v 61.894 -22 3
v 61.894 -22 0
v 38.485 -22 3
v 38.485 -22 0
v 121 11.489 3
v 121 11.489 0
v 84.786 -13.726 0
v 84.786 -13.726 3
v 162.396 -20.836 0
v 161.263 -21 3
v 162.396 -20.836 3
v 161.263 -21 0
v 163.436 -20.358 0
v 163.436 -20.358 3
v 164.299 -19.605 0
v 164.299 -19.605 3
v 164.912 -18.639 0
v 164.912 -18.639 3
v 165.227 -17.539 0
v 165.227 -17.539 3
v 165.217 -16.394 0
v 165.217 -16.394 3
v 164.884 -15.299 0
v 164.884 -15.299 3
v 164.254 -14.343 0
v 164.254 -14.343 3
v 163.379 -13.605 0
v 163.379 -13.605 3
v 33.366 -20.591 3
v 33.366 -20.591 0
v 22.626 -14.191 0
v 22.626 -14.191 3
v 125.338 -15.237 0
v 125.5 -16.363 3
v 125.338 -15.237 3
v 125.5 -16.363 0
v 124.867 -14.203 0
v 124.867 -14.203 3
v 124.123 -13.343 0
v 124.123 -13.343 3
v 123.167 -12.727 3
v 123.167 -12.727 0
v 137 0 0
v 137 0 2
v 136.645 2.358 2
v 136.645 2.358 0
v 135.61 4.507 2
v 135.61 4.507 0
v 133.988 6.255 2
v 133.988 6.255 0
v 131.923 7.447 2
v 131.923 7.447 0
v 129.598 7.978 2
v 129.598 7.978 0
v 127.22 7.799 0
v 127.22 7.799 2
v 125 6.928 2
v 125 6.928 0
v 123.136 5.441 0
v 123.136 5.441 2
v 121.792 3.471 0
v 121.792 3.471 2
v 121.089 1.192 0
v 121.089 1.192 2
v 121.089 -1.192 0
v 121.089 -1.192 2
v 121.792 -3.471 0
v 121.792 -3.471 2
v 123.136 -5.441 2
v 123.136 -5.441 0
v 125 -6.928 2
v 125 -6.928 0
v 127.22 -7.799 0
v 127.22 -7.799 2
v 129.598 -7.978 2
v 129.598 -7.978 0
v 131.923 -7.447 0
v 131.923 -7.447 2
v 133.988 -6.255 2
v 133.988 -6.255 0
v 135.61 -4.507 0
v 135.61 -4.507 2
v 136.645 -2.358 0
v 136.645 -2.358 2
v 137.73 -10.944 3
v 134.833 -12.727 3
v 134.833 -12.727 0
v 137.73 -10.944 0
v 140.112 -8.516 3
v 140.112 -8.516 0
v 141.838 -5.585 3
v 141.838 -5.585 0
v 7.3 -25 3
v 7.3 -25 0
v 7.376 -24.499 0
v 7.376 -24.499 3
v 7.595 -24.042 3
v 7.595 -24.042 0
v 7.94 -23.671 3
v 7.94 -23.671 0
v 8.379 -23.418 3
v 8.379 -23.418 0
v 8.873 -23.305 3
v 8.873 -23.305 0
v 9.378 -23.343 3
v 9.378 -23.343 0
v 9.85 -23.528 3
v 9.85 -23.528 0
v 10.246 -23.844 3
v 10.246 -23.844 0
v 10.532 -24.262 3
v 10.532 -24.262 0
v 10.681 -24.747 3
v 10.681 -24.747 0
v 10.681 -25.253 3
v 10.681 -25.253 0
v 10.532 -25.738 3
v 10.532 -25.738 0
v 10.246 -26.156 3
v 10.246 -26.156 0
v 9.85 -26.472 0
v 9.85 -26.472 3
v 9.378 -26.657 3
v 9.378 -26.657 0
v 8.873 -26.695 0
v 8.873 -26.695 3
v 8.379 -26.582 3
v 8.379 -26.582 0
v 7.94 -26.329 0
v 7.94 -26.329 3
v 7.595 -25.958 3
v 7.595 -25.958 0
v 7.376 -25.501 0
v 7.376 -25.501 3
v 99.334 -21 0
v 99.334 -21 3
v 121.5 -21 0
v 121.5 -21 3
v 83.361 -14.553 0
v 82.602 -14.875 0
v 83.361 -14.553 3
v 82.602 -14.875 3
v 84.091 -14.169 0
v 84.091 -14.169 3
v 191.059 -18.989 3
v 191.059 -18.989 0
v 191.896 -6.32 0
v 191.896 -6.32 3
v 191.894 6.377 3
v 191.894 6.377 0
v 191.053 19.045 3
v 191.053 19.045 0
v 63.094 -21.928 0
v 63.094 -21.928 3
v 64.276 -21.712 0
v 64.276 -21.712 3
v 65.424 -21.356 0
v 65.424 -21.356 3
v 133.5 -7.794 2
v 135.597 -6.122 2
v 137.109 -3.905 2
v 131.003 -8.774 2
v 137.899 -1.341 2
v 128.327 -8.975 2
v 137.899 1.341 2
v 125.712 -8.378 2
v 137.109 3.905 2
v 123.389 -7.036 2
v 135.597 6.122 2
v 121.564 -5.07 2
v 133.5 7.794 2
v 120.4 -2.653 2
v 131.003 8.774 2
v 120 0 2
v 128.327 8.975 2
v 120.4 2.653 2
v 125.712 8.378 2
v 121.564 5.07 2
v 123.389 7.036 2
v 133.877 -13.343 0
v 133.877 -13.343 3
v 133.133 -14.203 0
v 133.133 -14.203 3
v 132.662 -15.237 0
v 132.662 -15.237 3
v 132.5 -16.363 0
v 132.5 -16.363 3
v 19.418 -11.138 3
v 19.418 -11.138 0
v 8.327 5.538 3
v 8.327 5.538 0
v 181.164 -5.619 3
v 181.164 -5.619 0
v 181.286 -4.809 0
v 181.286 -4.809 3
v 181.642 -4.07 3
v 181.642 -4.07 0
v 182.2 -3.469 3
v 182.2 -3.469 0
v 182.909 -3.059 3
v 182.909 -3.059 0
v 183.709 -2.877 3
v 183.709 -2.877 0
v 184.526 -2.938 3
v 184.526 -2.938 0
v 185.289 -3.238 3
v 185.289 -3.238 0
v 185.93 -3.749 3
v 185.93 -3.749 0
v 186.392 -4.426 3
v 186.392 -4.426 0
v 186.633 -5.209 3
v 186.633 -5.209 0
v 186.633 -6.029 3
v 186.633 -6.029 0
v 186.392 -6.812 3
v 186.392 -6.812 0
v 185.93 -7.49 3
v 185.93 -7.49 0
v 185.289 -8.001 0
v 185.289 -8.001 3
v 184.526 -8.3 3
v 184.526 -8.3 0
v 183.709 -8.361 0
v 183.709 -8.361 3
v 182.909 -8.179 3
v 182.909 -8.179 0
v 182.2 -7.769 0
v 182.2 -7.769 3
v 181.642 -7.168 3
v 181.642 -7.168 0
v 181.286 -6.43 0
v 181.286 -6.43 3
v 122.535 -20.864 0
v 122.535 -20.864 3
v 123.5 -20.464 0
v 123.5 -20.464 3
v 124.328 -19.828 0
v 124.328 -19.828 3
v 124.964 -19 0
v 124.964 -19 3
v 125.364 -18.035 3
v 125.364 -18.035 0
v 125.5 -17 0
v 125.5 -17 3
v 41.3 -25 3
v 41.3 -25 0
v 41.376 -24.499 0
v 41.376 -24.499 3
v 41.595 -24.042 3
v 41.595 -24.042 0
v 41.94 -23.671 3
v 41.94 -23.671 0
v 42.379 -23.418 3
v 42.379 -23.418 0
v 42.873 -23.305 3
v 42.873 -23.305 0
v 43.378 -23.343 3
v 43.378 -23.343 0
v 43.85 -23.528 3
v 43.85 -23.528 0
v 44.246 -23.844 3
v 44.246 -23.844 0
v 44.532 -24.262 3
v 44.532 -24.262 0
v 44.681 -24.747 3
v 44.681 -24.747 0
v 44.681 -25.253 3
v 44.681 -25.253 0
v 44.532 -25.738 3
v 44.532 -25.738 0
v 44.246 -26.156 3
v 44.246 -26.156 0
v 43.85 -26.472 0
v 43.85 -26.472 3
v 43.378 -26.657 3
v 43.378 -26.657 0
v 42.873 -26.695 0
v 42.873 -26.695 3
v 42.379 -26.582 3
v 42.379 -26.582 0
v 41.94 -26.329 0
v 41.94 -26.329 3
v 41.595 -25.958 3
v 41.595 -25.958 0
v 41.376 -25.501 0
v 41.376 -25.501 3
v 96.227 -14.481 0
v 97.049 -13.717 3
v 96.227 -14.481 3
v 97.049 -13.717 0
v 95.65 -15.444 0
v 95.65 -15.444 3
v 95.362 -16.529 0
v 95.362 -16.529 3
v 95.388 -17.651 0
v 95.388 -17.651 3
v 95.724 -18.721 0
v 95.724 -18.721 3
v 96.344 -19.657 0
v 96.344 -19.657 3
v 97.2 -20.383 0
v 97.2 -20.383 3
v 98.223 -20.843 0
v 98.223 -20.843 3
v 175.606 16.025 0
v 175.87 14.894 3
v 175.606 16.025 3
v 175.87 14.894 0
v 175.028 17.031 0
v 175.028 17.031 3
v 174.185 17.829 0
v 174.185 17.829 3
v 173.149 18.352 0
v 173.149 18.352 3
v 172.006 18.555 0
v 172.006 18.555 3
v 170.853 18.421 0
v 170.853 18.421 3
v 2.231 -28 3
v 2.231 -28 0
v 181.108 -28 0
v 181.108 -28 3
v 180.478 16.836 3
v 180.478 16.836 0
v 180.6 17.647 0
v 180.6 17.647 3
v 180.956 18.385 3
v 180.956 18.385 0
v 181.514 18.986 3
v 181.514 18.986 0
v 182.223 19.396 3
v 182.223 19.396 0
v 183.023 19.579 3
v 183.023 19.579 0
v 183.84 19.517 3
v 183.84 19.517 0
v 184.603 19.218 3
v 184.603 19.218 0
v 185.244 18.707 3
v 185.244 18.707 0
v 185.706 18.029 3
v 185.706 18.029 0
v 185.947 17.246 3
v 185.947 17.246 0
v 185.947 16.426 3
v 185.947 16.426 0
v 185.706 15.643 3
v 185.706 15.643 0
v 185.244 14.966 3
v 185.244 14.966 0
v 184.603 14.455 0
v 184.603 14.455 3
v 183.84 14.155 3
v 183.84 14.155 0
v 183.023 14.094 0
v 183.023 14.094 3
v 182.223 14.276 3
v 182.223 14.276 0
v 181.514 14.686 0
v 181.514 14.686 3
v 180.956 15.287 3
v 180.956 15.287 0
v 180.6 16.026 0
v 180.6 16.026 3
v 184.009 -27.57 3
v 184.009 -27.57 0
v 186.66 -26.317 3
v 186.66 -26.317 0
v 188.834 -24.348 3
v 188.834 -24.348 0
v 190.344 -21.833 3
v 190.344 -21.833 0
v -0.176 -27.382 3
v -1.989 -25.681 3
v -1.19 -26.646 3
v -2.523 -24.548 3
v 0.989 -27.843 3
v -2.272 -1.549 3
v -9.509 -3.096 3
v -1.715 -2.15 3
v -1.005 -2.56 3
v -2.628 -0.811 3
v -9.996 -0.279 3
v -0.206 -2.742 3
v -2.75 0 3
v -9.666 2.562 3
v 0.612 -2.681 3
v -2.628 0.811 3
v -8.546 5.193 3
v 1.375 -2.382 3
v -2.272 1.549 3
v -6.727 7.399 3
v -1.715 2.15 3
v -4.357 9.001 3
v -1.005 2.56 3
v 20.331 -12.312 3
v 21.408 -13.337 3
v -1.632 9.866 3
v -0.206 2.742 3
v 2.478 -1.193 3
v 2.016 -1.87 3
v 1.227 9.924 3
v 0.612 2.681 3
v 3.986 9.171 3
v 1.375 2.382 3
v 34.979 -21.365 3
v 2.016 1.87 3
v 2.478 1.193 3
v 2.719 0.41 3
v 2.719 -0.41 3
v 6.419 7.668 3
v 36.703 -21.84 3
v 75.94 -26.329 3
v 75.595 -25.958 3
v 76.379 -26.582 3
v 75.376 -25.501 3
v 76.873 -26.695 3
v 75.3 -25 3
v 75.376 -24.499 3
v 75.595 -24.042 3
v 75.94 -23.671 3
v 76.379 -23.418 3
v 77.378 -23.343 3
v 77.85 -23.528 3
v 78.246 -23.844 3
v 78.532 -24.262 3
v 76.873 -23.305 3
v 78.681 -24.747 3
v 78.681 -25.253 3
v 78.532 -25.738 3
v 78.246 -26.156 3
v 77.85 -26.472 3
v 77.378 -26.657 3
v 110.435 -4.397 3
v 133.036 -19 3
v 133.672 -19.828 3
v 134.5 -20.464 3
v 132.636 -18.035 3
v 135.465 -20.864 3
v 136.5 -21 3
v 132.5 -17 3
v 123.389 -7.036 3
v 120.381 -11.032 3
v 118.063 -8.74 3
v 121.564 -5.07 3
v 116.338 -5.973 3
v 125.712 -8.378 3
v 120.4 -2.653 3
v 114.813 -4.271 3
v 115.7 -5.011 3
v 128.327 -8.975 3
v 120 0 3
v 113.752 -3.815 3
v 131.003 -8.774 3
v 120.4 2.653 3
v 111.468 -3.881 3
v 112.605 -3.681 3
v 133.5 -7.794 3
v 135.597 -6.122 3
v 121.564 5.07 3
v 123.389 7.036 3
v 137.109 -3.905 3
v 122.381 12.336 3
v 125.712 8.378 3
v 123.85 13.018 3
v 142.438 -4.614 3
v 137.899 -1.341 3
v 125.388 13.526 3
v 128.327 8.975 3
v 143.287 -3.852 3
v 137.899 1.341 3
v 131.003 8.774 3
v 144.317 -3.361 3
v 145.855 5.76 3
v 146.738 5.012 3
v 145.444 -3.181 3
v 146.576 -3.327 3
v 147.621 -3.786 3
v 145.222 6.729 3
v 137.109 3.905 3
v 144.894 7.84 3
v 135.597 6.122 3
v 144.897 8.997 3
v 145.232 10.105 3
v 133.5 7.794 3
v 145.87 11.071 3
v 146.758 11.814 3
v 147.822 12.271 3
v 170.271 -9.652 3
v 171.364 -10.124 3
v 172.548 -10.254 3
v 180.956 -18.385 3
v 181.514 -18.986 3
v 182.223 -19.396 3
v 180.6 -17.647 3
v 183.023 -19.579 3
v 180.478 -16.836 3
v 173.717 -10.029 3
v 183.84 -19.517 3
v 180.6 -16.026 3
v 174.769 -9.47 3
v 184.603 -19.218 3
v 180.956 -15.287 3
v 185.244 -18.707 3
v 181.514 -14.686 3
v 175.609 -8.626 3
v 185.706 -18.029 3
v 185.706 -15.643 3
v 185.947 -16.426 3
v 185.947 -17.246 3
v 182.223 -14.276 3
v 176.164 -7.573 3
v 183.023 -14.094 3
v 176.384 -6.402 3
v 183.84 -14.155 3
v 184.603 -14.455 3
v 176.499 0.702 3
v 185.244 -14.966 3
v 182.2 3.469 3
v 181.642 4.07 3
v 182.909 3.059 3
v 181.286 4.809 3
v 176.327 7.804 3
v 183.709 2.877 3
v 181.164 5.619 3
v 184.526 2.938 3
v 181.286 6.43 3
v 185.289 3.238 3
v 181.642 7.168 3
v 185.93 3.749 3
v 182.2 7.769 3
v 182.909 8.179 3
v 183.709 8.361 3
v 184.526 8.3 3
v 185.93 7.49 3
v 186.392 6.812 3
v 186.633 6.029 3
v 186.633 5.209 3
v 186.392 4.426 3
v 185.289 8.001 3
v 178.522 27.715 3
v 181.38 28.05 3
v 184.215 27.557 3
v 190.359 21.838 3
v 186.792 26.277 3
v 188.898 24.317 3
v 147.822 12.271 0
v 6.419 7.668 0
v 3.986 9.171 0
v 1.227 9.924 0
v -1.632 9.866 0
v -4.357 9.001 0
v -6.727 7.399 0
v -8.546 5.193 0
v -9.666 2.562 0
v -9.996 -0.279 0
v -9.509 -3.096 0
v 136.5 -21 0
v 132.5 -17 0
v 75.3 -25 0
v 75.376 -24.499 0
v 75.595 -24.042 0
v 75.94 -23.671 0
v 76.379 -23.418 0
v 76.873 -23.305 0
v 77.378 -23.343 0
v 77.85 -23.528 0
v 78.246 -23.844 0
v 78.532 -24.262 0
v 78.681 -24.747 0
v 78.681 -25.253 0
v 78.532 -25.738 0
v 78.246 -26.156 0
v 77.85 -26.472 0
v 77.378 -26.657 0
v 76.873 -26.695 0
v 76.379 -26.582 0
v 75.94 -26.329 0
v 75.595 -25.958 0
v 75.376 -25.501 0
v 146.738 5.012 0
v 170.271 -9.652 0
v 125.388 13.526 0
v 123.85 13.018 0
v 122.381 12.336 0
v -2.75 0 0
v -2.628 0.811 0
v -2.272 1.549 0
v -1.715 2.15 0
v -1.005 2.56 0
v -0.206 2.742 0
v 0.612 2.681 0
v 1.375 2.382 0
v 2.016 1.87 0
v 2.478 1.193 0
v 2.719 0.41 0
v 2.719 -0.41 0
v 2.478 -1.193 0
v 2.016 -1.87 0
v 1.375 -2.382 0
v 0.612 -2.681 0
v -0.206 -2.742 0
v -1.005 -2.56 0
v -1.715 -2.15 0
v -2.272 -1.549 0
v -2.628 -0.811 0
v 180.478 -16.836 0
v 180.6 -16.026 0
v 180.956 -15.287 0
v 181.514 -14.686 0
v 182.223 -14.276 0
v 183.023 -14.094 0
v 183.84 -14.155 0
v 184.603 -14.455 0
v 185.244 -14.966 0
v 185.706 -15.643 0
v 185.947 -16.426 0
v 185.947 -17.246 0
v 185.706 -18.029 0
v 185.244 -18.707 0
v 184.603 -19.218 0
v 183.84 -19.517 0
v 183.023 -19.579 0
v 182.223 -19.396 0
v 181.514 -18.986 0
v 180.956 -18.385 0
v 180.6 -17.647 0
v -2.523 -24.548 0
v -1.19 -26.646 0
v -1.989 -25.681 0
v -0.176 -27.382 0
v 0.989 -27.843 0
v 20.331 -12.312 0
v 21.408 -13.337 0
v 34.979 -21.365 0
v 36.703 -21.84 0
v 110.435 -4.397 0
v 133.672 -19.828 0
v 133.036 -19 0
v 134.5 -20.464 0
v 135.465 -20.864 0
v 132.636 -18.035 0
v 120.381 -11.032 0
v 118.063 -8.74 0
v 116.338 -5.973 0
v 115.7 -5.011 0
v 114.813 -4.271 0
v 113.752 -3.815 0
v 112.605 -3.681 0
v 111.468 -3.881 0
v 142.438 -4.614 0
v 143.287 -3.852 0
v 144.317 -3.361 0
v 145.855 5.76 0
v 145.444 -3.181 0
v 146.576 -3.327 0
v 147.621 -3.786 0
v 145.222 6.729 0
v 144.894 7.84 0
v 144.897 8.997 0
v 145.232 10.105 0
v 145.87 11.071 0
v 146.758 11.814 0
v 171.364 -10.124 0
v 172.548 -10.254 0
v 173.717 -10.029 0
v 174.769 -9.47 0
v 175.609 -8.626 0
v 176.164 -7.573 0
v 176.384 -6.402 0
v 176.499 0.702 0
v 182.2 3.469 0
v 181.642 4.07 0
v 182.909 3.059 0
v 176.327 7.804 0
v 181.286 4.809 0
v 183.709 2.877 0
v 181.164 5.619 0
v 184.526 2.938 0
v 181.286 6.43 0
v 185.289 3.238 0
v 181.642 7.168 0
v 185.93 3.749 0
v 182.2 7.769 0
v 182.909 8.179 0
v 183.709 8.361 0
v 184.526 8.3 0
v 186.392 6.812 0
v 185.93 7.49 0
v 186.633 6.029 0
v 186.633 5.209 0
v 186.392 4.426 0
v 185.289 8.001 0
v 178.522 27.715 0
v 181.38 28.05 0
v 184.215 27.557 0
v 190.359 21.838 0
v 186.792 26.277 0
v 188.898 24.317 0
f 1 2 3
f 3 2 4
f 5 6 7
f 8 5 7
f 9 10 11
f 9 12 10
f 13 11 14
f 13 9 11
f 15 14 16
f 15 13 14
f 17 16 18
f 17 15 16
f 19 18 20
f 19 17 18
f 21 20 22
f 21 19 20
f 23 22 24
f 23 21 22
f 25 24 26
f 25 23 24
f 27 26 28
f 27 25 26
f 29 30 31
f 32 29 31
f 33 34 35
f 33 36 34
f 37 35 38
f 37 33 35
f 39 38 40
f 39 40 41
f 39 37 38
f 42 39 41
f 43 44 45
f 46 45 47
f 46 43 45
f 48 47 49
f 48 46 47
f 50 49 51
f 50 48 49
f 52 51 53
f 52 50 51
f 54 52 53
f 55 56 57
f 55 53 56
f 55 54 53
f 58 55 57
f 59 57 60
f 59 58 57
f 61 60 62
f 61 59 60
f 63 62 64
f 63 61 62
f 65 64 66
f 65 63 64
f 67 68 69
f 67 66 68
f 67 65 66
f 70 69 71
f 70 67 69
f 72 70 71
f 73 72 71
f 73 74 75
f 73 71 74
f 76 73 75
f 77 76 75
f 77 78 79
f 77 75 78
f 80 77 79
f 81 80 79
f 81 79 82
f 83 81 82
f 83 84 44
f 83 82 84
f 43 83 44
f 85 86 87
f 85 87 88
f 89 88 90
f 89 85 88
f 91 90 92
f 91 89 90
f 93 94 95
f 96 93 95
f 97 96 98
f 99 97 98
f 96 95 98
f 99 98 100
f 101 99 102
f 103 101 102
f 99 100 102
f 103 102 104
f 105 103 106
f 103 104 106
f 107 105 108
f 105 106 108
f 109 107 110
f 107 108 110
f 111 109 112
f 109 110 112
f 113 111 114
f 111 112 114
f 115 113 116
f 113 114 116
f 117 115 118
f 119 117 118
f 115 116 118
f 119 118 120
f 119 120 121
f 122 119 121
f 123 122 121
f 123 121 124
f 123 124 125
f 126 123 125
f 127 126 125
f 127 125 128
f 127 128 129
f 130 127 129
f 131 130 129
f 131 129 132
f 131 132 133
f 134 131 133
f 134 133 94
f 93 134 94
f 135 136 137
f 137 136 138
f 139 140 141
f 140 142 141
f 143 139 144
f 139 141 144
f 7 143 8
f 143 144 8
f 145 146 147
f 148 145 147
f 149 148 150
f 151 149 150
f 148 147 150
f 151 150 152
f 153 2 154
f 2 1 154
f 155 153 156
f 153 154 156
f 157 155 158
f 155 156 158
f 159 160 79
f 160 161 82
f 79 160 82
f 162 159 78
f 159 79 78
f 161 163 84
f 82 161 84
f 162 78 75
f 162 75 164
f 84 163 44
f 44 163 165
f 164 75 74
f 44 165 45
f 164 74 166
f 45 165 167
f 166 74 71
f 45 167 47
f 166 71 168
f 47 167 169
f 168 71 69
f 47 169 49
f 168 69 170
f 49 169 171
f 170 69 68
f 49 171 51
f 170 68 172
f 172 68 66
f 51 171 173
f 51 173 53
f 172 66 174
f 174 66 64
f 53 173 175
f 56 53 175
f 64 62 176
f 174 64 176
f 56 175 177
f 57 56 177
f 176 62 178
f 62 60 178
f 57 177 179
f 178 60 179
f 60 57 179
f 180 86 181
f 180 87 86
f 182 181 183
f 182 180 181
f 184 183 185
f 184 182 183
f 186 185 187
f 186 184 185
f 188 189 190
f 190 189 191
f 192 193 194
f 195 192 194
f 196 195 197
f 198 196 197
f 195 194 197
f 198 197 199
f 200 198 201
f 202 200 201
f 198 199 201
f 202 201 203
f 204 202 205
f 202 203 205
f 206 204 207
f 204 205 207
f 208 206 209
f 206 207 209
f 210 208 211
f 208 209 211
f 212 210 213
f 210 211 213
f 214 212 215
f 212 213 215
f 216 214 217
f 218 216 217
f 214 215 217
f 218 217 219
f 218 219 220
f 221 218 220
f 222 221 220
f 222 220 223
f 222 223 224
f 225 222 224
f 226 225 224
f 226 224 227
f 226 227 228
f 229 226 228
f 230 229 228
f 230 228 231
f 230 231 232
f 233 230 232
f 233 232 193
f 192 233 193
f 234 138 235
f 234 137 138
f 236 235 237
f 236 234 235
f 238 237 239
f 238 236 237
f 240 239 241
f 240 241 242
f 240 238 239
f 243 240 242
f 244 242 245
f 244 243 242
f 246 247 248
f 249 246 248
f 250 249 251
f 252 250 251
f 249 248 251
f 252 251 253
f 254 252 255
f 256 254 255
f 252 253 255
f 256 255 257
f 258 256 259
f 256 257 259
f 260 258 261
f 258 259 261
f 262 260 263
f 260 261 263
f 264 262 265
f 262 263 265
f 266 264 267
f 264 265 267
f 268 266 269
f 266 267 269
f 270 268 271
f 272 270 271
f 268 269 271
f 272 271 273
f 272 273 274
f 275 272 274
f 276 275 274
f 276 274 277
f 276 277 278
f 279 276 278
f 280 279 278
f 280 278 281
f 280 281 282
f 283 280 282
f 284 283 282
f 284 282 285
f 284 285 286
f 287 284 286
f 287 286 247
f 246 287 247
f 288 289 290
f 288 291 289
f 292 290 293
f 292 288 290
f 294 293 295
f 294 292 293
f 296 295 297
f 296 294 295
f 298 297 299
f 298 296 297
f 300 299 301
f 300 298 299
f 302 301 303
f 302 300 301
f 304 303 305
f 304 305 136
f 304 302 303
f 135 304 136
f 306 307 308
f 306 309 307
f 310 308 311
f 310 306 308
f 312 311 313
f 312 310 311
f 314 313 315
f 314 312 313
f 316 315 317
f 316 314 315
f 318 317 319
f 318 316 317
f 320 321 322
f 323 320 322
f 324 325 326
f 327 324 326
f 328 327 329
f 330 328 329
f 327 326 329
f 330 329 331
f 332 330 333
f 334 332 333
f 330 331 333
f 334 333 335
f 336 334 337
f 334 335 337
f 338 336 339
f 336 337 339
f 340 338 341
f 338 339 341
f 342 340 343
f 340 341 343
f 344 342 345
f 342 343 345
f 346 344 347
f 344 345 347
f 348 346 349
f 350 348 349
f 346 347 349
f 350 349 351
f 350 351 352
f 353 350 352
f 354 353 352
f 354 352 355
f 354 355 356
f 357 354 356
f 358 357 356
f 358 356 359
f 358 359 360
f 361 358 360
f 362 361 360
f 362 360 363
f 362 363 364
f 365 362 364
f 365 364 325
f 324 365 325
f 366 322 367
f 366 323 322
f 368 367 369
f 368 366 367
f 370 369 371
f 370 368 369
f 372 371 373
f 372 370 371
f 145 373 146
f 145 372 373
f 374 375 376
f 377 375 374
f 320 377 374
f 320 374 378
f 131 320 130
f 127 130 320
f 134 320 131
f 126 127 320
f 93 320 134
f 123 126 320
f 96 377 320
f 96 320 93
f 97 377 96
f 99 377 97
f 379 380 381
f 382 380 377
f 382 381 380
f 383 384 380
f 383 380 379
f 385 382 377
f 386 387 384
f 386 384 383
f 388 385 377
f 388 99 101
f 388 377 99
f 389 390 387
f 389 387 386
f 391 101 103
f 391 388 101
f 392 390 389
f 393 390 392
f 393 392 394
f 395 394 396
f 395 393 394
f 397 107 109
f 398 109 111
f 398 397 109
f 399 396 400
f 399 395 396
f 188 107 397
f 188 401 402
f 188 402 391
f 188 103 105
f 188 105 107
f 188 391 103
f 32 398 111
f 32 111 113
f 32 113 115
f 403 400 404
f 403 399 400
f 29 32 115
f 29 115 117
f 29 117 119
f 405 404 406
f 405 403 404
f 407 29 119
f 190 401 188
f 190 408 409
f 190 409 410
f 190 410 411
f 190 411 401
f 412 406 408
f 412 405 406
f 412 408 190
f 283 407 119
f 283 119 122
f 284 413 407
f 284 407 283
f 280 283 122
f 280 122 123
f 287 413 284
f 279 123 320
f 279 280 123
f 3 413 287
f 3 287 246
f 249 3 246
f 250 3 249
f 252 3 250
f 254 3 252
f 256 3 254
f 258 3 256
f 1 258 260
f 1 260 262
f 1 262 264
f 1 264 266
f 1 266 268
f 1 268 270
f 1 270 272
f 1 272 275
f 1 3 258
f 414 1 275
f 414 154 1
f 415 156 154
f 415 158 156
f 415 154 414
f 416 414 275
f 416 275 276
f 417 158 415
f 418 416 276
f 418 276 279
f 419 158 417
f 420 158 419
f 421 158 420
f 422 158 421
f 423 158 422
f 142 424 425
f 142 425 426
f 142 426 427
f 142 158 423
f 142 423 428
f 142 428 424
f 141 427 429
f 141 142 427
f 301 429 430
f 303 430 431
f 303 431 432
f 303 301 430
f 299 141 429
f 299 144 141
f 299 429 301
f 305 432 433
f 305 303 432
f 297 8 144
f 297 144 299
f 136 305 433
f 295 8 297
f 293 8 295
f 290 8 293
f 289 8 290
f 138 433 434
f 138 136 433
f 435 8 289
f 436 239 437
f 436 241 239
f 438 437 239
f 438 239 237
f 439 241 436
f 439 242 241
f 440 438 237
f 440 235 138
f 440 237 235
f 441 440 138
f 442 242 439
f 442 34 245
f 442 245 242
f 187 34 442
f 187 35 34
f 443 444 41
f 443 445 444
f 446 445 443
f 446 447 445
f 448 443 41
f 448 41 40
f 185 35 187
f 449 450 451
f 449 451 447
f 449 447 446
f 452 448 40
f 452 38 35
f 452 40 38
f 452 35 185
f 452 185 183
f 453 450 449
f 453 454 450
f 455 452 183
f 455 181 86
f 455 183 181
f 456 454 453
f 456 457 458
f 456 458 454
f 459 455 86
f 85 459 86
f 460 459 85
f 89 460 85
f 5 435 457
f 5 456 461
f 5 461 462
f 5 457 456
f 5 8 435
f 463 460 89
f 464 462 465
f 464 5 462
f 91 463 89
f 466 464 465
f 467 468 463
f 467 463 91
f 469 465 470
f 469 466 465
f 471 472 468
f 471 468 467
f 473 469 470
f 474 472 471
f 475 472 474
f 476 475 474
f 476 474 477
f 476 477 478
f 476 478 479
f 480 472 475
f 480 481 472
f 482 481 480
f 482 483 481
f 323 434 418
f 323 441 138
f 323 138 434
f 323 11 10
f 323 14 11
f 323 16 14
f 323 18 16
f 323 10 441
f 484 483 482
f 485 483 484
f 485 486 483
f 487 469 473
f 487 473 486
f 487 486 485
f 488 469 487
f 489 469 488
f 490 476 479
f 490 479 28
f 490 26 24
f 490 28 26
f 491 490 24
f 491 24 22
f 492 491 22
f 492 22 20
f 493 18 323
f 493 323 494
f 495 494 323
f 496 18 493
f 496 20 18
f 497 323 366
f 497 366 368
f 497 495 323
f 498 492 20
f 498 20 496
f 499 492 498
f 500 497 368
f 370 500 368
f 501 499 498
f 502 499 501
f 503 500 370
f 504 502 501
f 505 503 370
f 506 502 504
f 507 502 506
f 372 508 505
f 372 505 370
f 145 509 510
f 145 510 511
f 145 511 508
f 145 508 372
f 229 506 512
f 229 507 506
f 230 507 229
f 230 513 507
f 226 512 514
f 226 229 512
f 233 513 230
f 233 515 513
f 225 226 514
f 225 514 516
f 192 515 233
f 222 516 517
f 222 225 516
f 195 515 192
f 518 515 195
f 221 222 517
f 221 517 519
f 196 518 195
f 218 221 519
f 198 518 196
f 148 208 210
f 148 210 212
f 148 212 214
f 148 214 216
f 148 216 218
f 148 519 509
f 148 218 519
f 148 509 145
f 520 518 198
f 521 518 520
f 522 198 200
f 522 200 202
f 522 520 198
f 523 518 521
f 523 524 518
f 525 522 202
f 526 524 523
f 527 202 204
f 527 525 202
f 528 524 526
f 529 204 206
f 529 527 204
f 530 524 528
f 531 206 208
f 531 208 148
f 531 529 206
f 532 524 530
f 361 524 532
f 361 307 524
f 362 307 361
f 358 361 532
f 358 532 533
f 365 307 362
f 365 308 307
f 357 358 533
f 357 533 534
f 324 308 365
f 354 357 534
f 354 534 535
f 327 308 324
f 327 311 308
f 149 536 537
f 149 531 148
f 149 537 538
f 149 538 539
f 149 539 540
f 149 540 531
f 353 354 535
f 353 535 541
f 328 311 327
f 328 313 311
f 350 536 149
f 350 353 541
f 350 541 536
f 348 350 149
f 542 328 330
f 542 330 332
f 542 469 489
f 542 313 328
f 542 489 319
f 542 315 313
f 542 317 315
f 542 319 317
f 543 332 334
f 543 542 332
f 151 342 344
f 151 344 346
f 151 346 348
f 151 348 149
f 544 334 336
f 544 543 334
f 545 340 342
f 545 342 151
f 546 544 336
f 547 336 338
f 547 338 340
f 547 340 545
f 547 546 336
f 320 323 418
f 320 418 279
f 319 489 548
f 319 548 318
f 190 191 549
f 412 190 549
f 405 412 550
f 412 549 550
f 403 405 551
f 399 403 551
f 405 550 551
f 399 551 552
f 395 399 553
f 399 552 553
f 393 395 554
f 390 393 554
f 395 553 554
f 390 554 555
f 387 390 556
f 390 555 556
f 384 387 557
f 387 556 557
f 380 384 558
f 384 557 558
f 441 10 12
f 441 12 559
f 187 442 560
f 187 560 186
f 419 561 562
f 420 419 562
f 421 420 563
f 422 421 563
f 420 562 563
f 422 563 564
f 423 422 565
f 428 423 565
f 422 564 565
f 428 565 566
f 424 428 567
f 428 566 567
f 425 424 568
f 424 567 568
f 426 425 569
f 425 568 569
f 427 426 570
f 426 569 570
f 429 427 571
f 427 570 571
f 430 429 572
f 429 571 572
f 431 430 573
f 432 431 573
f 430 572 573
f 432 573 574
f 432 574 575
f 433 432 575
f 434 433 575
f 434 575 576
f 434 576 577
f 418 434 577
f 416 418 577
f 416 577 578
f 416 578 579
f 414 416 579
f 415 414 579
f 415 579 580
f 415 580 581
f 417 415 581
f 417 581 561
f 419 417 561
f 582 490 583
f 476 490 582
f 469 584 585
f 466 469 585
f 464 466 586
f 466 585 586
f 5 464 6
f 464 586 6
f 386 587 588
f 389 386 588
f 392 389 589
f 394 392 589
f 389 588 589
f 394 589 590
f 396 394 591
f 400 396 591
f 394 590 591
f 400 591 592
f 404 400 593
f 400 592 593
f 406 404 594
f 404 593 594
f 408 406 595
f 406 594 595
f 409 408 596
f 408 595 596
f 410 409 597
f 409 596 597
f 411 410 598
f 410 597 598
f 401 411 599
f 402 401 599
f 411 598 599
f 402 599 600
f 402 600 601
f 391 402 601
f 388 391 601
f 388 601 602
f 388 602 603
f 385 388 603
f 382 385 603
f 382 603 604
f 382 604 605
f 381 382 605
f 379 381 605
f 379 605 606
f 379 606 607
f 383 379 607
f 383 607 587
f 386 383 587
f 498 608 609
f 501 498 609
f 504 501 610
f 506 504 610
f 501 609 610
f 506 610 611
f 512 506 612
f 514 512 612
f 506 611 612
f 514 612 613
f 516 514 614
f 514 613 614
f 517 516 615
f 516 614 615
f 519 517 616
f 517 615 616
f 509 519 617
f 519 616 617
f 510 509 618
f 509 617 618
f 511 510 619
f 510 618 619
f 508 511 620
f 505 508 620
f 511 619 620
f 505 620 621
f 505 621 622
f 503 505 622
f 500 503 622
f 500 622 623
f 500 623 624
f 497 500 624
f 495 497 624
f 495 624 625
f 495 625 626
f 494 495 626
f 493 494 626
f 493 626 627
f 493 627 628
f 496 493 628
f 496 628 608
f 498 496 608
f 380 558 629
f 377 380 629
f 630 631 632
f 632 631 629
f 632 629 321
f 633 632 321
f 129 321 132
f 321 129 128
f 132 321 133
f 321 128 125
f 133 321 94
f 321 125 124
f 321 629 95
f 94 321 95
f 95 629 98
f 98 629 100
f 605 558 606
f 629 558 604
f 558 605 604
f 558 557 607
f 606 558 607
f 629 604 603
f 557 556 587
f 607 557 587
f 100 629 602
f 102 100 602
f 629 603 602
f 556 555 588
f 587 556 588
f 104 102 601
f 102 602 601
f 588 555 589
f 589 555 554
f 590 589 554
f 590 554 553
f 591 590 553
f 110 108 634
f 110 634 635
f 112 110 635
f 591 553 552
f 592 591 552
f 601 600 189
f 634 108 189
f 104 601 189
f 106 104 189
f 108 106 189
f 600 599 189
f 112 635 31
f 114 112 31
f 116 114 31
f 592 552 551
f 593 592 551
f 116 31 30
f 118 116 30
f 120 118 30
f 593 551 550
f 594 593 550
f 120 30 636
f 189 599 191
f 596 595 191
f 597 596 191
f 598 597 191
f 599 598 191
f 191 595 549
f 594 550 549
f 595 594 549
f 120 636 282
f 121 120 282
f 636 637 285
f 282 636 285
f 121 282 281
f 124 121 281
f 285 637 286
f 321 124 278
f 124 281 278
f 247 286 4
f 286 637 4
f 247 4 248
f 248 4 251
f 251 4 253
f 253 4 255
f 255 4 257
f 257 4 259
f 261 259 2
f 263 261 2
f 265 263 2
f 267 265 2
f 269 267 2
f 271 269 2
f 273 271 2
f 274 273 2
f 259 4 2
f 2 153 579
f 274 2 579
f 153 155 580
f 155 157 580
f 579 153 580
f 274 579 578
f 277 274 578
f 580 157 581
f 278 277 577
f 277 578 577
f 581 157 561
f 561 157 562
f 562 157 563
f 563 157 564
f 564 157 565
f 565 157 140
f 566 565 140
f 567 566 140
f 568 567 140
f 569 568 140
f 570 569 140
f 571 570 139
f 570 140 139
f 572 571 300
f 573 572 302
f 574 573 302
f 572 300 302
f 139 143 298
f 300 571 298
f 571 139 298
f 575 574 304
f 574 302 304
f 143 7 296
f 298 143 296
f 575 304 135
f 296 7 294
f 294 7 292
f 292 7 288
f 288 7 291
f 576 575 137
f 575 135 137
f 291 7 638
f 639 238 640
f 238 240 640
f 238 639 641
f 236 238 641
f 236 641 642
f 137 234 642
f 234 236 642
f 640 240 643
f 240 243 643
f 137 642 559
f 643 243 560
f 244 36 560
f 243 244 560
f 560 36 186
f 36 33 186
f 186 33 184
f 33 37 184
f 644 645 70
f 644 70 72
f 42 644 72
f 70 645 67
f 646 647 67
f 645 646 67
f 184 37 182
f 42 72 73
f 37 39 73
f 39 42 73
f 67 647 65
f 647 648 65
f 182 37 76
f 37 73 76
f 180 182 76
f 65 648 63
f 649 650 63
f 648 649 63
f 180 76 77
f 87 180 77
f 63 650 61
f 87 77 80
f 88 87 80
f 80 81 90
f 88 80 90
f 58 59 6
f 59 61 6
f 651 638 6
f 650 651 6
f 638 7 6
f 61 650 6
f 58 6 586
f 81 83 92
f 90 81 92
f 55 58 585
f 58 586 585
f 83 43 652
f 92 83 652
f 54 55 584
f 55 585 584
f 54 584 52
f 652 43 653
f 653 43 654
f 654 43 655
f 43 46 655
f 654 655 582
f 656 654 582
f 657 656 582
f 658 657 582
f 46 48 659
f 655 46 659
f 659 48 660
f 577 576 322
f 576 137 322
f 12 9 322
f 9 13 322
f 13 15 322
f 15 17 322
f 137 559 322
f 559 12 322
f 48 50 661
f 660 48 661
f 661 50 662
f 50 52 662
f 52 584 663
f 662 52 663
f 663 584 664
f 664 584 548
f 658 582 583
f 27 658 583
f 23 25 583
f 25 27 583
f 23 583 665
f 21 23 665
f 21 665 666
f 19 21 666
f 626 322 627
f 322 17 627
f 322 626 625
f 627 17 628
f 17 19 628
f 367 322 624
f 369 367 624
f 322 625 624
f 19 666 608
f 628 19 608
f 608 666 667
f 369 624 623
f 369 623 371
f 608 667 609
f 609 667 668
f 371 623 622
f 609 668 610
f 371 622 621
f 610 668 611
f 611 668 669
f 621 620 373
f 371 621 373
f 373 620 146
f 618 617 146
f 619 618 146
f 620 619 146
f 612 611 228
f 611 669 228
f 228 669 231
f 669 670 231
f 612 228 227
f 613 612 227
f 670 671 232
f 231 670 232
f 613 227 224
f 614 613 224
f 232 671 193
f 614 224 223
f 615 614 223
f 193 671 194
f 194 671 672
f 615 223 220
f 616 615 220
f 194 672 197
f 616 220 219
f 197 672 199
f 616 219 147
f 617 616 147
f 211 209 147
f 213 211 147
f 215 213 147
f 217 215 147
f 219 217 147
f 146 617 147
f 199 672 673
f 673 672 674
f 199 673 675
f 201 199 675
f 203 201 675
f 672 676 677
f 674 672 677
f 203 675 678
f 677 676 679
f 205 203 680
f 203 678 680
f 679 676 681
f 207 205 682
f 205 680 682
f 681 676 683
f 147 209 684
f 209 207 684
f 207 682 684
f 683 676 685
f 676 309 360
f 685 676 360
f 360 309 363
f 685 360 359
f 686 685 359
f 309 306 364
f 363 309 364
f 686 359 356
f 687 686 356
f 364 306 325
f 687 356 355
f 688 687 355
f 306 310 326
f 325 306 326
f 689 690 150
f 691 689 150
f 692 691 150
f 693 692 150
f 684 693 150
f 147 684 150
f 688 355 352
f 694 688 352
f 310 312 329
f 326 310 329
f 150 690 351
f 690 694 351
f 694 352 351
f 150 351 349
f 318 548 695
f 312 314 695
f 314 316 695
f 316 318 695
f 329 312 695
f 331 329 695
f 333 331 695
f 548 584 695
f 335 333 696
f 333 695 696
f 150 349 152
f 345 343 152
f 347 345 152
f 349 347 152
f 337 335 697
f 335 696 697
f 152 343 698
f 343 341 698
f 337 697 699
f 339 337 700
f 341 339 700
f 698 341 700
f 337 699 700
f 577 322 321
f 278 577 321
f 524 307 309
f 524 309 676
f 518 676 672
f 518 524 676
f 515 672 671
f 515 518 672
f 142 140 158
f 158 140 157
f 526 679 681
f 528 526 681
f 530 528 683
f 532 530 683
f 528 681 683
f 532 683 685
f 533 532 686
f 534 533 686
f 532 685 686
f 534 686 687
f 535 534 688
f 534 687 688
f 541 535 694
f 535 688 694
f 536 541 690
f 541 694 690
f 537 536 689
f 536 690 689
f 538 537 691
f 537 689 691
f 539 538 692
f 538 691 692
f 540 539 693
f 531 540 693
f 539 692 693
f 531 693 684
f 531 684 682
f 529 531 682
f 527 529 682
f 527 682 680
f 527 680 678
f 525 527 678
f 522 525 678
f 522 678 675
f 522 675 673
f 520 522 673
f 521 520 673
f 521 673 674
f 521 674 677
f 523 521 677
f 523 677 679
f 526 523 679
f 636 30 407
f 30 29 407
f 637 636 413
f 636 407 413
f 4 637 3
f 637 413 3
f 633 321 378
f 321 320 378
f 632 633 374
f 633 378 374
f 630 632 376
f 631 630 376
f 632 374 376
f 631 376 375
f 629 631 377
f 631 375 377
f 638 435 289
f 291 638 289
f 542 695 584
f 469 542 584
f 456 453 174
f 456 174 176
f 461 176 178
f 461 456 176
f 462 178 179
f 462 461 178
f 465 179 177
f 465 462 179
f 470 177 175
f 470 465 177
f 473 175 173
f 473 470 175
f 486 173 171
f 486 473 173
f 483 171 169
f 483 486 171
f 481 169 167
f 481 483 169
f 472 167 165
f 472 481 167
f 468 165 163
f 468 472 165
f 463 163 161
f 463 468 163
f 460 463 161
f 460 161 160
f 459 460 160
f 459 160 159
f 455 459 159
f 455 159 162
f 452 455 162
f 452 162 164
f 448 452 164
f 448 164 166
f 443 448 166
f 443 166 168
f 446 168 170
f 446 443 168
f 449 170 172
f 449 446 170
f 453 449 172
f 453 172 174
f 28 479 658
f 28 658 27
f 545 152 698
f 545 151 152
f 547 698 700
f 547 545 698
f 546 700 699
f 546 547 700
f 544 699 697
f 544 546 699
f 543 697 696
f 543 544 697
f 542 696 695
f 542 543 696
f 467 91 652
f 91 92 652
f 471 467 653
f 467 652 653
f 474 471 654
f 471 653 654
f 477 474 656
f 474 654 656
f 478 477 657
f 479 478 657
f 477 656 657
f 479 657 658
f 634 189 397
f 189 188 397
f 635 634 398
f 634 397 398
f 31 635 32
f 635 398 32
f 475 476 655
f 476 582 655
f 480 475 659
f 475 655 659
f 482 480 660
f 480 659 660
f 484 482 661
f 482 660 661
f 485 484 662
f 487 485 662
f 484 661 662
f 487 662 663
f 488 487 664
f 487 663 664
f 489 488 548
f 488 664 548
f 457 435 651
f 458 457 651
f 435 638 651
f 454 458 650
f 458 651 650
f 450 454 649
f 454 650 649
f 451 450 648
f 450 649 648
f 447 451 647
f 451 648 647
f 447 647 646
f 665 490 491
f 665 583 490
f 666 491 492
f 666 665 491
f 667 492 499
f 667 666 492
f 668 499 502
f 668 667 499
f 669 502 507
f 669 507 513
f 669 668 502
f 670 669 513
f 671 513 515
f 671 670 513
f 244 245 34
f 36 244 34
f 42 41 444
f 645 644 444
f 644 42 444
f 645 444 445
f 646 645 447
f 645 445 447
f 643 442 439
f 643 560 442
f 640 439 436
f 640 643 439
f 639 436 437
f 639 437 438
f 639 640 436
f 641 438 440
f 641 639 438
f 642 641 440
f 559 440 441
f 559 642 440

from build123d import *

# Parameters (mm, degrees)
SKETCH_1_R          = 8
EXTRUDE_1_DEPTH     = 3
HOLE_WIZARD_M31_D   = 3.4
HOLE_WIZARD_M51_D   = 5.5
HOLE_WIZARD_M52_D   = 5.5
FILLET_1_R          = 10
FILLET_2_R          = 5
CUT_EXTRUDE_1_DEPTH = 195.061830596
FILLET_3_R          = 4
SKETCH_9_R          = 9
CUT_EXTRUDE_2_DEPTH = 1


with BuildPart() as part:
    # Эскиз1 → Бобышка-Вытянуть1 (new body)
    with BuildSketch(Plane.XY):
        with BuildLine():
            Line((-9.508526364, -3.096437692), (-1.398717752, -28))
            Line((-1.398717752, -28), (189.947361129, -28))
            ThreePointArc((189.947361129, -28), (191.995297124, 1.34383112), (189.536809823, 30.656120467))
            Line((189.536809823, 30.656120467), (125.388049295, 13.526041997))
            ThreePointArc((125.388049295, 13.526041997), (123.105499175, 12.698616461), (121.000225207, 11.489282104))
            Line((121.000225207, 11.489282104), (83.76563687, -14.436473614))
            Line((83.76563687, -14.436473614), (63.718090084, -22))
            Line((63.718090084, -22), (35.731449132, -22))
            Line((35.731449132, -22), (20.675178874, -13.02912429))
            Line((20.675178874, -13.02912429), (8.326583423, 5.537870395))
            ThreePointArc((8.326583423, 5.537870395), (-4.357415095, 9.00071851), (-9.508526364, -3.096437692))
        make_face()
        with Locations((129, 0)):
            Circle(SKETCH_1_R, mode=Mode.SUBTRACT)
    extrude(amount=EXTRUDE_1_DEPTH)

    # Отверстие с зазором M31 (through all)
    with Locations(Plane.XY.offset(3)):
        with Locations((9, -25), (43, -25), (77, -25)):
            Hole(HOLE_WIZARD_M31_D / 2)

    # Отверстие с зазором M51 (through all)
    with Locations(Plane.XY.offset(3)):
        with Locations((0, 0)):
            Hole(HOLE_WIZARD_M51_D / 2)

    # Отверстие с зазором M52 (through all)
    with Locations(Plane.XY.offset(3)):
        with Locations((183.228106674, 16.836297834), (183.914180714, 5.619086431), (183.914180714, -5.619086431), (183.228106674, -16.836297834)):
            Hole(HOLE_WIZARD_M52_D / 2)

    # Скругление1
    fillet_1_edges = [part.edges().sort_by_distance(p)[0] for p in [
        (35.731449132, -22, 1.5),
        (63.718090084, -22, 1.5),
        (83.76563687, -14.436473614, 1.5),
        (189.536809823, 30.656120467, 1.5),
        (189.947361129, -28, 1.5),
        (20.675178874, -13.02912429, 1.5),
    ]]
    fillet(fillet_1_edges, radius=FILLET_1_R)

    # Скругление2
    fillet_2_edges = [part.edges().sort_by_distance(p)[0] for p in [
        (-1.398717752, -28, 1.5),
    ]]
    fillet(fillet_2_edges, radius=FILLET_2_R)

    # Эскиз8 → Вырез-Вытянуть1 (cut, through all)
    with BuildSketch(Plane.XY.offset(3)):
        with BuildLine():
            Line((138.90792063, 9.891062066), (175.404223108, 19.636917172))
            ThreePointArc((175.404223108, 19.636917172), (176.470620047, 3.220288824), (176.003884761, -13.22431658))
            Line((176.003884761, -13.22431658), (138.90792063, 9.891062066))
        make_face()
        with BuildLine():
            Line((142.971746687, -0.888985098), (175.246255309, -21))
            Line((175.246255309, -21), (132.5, -21))
            Line((132.5, -21), (132.5, -13.555441712))
            ThreePointArc((132.5, -13.555441712), (139.790053932, -8.92046726), (142.971746687, -0.888985098))
        make_face()
        with BuildLine():
            Line((115.05010243, -1.183367143), (86.589440581, -21))
            Line((86.589440581, -21), (125.5, -21))
            Line((125.5, -21), (125.5, -13.555441712))
            ThreePointArc((125.5, -13.555441712), (118.304590303, -9.033726331), (115.05010243, -1.183367143))
        make_face()
    extrude(amount=-CUT_EXTRUDE_1_DEPTH, mode=Mode.SUBTRACT)

    # Скругление3
    fillet_3_edges = [part.edges().sort_by_distance(p)[0] for p in [
        (175.404223108, 19.636917172, 1.5),
        (176.003884761, -13.22431658, 1.5),
        (138.90792063, 9.891062066, 1.5),
        (115.05010243, -1.183367143, 1.5),
        (125.5, -13.555441712, 1.5),
        (125.5, -21, 1.5),
        (86.589440581, -21, 1.5),
        (175.246255309, -21, 1.5),
        (132.5, -21, 1.5),
        (132.5, -13.555441712, 1.5),
        (142.971746687, -0.888985098, 1.5),
    ]]
    fillet(fillet_3_edges, radius=FILLET_3_R)

    # Эскиз9 → Вырез-Вытянуть2 (cut)
    with BuildSketch(Plane(origin=(0, 0, 3), x_dir=(-1, 0, 0), z_dir=(0, 0, -1))):
        with Locations((-129, 0)):
            Circle(SKETCH_9_R)
    extrude(amount=CUT_EXTRUDE_2_DEPTH, mode=Mode.SUBTRACT)


solid = part.part
